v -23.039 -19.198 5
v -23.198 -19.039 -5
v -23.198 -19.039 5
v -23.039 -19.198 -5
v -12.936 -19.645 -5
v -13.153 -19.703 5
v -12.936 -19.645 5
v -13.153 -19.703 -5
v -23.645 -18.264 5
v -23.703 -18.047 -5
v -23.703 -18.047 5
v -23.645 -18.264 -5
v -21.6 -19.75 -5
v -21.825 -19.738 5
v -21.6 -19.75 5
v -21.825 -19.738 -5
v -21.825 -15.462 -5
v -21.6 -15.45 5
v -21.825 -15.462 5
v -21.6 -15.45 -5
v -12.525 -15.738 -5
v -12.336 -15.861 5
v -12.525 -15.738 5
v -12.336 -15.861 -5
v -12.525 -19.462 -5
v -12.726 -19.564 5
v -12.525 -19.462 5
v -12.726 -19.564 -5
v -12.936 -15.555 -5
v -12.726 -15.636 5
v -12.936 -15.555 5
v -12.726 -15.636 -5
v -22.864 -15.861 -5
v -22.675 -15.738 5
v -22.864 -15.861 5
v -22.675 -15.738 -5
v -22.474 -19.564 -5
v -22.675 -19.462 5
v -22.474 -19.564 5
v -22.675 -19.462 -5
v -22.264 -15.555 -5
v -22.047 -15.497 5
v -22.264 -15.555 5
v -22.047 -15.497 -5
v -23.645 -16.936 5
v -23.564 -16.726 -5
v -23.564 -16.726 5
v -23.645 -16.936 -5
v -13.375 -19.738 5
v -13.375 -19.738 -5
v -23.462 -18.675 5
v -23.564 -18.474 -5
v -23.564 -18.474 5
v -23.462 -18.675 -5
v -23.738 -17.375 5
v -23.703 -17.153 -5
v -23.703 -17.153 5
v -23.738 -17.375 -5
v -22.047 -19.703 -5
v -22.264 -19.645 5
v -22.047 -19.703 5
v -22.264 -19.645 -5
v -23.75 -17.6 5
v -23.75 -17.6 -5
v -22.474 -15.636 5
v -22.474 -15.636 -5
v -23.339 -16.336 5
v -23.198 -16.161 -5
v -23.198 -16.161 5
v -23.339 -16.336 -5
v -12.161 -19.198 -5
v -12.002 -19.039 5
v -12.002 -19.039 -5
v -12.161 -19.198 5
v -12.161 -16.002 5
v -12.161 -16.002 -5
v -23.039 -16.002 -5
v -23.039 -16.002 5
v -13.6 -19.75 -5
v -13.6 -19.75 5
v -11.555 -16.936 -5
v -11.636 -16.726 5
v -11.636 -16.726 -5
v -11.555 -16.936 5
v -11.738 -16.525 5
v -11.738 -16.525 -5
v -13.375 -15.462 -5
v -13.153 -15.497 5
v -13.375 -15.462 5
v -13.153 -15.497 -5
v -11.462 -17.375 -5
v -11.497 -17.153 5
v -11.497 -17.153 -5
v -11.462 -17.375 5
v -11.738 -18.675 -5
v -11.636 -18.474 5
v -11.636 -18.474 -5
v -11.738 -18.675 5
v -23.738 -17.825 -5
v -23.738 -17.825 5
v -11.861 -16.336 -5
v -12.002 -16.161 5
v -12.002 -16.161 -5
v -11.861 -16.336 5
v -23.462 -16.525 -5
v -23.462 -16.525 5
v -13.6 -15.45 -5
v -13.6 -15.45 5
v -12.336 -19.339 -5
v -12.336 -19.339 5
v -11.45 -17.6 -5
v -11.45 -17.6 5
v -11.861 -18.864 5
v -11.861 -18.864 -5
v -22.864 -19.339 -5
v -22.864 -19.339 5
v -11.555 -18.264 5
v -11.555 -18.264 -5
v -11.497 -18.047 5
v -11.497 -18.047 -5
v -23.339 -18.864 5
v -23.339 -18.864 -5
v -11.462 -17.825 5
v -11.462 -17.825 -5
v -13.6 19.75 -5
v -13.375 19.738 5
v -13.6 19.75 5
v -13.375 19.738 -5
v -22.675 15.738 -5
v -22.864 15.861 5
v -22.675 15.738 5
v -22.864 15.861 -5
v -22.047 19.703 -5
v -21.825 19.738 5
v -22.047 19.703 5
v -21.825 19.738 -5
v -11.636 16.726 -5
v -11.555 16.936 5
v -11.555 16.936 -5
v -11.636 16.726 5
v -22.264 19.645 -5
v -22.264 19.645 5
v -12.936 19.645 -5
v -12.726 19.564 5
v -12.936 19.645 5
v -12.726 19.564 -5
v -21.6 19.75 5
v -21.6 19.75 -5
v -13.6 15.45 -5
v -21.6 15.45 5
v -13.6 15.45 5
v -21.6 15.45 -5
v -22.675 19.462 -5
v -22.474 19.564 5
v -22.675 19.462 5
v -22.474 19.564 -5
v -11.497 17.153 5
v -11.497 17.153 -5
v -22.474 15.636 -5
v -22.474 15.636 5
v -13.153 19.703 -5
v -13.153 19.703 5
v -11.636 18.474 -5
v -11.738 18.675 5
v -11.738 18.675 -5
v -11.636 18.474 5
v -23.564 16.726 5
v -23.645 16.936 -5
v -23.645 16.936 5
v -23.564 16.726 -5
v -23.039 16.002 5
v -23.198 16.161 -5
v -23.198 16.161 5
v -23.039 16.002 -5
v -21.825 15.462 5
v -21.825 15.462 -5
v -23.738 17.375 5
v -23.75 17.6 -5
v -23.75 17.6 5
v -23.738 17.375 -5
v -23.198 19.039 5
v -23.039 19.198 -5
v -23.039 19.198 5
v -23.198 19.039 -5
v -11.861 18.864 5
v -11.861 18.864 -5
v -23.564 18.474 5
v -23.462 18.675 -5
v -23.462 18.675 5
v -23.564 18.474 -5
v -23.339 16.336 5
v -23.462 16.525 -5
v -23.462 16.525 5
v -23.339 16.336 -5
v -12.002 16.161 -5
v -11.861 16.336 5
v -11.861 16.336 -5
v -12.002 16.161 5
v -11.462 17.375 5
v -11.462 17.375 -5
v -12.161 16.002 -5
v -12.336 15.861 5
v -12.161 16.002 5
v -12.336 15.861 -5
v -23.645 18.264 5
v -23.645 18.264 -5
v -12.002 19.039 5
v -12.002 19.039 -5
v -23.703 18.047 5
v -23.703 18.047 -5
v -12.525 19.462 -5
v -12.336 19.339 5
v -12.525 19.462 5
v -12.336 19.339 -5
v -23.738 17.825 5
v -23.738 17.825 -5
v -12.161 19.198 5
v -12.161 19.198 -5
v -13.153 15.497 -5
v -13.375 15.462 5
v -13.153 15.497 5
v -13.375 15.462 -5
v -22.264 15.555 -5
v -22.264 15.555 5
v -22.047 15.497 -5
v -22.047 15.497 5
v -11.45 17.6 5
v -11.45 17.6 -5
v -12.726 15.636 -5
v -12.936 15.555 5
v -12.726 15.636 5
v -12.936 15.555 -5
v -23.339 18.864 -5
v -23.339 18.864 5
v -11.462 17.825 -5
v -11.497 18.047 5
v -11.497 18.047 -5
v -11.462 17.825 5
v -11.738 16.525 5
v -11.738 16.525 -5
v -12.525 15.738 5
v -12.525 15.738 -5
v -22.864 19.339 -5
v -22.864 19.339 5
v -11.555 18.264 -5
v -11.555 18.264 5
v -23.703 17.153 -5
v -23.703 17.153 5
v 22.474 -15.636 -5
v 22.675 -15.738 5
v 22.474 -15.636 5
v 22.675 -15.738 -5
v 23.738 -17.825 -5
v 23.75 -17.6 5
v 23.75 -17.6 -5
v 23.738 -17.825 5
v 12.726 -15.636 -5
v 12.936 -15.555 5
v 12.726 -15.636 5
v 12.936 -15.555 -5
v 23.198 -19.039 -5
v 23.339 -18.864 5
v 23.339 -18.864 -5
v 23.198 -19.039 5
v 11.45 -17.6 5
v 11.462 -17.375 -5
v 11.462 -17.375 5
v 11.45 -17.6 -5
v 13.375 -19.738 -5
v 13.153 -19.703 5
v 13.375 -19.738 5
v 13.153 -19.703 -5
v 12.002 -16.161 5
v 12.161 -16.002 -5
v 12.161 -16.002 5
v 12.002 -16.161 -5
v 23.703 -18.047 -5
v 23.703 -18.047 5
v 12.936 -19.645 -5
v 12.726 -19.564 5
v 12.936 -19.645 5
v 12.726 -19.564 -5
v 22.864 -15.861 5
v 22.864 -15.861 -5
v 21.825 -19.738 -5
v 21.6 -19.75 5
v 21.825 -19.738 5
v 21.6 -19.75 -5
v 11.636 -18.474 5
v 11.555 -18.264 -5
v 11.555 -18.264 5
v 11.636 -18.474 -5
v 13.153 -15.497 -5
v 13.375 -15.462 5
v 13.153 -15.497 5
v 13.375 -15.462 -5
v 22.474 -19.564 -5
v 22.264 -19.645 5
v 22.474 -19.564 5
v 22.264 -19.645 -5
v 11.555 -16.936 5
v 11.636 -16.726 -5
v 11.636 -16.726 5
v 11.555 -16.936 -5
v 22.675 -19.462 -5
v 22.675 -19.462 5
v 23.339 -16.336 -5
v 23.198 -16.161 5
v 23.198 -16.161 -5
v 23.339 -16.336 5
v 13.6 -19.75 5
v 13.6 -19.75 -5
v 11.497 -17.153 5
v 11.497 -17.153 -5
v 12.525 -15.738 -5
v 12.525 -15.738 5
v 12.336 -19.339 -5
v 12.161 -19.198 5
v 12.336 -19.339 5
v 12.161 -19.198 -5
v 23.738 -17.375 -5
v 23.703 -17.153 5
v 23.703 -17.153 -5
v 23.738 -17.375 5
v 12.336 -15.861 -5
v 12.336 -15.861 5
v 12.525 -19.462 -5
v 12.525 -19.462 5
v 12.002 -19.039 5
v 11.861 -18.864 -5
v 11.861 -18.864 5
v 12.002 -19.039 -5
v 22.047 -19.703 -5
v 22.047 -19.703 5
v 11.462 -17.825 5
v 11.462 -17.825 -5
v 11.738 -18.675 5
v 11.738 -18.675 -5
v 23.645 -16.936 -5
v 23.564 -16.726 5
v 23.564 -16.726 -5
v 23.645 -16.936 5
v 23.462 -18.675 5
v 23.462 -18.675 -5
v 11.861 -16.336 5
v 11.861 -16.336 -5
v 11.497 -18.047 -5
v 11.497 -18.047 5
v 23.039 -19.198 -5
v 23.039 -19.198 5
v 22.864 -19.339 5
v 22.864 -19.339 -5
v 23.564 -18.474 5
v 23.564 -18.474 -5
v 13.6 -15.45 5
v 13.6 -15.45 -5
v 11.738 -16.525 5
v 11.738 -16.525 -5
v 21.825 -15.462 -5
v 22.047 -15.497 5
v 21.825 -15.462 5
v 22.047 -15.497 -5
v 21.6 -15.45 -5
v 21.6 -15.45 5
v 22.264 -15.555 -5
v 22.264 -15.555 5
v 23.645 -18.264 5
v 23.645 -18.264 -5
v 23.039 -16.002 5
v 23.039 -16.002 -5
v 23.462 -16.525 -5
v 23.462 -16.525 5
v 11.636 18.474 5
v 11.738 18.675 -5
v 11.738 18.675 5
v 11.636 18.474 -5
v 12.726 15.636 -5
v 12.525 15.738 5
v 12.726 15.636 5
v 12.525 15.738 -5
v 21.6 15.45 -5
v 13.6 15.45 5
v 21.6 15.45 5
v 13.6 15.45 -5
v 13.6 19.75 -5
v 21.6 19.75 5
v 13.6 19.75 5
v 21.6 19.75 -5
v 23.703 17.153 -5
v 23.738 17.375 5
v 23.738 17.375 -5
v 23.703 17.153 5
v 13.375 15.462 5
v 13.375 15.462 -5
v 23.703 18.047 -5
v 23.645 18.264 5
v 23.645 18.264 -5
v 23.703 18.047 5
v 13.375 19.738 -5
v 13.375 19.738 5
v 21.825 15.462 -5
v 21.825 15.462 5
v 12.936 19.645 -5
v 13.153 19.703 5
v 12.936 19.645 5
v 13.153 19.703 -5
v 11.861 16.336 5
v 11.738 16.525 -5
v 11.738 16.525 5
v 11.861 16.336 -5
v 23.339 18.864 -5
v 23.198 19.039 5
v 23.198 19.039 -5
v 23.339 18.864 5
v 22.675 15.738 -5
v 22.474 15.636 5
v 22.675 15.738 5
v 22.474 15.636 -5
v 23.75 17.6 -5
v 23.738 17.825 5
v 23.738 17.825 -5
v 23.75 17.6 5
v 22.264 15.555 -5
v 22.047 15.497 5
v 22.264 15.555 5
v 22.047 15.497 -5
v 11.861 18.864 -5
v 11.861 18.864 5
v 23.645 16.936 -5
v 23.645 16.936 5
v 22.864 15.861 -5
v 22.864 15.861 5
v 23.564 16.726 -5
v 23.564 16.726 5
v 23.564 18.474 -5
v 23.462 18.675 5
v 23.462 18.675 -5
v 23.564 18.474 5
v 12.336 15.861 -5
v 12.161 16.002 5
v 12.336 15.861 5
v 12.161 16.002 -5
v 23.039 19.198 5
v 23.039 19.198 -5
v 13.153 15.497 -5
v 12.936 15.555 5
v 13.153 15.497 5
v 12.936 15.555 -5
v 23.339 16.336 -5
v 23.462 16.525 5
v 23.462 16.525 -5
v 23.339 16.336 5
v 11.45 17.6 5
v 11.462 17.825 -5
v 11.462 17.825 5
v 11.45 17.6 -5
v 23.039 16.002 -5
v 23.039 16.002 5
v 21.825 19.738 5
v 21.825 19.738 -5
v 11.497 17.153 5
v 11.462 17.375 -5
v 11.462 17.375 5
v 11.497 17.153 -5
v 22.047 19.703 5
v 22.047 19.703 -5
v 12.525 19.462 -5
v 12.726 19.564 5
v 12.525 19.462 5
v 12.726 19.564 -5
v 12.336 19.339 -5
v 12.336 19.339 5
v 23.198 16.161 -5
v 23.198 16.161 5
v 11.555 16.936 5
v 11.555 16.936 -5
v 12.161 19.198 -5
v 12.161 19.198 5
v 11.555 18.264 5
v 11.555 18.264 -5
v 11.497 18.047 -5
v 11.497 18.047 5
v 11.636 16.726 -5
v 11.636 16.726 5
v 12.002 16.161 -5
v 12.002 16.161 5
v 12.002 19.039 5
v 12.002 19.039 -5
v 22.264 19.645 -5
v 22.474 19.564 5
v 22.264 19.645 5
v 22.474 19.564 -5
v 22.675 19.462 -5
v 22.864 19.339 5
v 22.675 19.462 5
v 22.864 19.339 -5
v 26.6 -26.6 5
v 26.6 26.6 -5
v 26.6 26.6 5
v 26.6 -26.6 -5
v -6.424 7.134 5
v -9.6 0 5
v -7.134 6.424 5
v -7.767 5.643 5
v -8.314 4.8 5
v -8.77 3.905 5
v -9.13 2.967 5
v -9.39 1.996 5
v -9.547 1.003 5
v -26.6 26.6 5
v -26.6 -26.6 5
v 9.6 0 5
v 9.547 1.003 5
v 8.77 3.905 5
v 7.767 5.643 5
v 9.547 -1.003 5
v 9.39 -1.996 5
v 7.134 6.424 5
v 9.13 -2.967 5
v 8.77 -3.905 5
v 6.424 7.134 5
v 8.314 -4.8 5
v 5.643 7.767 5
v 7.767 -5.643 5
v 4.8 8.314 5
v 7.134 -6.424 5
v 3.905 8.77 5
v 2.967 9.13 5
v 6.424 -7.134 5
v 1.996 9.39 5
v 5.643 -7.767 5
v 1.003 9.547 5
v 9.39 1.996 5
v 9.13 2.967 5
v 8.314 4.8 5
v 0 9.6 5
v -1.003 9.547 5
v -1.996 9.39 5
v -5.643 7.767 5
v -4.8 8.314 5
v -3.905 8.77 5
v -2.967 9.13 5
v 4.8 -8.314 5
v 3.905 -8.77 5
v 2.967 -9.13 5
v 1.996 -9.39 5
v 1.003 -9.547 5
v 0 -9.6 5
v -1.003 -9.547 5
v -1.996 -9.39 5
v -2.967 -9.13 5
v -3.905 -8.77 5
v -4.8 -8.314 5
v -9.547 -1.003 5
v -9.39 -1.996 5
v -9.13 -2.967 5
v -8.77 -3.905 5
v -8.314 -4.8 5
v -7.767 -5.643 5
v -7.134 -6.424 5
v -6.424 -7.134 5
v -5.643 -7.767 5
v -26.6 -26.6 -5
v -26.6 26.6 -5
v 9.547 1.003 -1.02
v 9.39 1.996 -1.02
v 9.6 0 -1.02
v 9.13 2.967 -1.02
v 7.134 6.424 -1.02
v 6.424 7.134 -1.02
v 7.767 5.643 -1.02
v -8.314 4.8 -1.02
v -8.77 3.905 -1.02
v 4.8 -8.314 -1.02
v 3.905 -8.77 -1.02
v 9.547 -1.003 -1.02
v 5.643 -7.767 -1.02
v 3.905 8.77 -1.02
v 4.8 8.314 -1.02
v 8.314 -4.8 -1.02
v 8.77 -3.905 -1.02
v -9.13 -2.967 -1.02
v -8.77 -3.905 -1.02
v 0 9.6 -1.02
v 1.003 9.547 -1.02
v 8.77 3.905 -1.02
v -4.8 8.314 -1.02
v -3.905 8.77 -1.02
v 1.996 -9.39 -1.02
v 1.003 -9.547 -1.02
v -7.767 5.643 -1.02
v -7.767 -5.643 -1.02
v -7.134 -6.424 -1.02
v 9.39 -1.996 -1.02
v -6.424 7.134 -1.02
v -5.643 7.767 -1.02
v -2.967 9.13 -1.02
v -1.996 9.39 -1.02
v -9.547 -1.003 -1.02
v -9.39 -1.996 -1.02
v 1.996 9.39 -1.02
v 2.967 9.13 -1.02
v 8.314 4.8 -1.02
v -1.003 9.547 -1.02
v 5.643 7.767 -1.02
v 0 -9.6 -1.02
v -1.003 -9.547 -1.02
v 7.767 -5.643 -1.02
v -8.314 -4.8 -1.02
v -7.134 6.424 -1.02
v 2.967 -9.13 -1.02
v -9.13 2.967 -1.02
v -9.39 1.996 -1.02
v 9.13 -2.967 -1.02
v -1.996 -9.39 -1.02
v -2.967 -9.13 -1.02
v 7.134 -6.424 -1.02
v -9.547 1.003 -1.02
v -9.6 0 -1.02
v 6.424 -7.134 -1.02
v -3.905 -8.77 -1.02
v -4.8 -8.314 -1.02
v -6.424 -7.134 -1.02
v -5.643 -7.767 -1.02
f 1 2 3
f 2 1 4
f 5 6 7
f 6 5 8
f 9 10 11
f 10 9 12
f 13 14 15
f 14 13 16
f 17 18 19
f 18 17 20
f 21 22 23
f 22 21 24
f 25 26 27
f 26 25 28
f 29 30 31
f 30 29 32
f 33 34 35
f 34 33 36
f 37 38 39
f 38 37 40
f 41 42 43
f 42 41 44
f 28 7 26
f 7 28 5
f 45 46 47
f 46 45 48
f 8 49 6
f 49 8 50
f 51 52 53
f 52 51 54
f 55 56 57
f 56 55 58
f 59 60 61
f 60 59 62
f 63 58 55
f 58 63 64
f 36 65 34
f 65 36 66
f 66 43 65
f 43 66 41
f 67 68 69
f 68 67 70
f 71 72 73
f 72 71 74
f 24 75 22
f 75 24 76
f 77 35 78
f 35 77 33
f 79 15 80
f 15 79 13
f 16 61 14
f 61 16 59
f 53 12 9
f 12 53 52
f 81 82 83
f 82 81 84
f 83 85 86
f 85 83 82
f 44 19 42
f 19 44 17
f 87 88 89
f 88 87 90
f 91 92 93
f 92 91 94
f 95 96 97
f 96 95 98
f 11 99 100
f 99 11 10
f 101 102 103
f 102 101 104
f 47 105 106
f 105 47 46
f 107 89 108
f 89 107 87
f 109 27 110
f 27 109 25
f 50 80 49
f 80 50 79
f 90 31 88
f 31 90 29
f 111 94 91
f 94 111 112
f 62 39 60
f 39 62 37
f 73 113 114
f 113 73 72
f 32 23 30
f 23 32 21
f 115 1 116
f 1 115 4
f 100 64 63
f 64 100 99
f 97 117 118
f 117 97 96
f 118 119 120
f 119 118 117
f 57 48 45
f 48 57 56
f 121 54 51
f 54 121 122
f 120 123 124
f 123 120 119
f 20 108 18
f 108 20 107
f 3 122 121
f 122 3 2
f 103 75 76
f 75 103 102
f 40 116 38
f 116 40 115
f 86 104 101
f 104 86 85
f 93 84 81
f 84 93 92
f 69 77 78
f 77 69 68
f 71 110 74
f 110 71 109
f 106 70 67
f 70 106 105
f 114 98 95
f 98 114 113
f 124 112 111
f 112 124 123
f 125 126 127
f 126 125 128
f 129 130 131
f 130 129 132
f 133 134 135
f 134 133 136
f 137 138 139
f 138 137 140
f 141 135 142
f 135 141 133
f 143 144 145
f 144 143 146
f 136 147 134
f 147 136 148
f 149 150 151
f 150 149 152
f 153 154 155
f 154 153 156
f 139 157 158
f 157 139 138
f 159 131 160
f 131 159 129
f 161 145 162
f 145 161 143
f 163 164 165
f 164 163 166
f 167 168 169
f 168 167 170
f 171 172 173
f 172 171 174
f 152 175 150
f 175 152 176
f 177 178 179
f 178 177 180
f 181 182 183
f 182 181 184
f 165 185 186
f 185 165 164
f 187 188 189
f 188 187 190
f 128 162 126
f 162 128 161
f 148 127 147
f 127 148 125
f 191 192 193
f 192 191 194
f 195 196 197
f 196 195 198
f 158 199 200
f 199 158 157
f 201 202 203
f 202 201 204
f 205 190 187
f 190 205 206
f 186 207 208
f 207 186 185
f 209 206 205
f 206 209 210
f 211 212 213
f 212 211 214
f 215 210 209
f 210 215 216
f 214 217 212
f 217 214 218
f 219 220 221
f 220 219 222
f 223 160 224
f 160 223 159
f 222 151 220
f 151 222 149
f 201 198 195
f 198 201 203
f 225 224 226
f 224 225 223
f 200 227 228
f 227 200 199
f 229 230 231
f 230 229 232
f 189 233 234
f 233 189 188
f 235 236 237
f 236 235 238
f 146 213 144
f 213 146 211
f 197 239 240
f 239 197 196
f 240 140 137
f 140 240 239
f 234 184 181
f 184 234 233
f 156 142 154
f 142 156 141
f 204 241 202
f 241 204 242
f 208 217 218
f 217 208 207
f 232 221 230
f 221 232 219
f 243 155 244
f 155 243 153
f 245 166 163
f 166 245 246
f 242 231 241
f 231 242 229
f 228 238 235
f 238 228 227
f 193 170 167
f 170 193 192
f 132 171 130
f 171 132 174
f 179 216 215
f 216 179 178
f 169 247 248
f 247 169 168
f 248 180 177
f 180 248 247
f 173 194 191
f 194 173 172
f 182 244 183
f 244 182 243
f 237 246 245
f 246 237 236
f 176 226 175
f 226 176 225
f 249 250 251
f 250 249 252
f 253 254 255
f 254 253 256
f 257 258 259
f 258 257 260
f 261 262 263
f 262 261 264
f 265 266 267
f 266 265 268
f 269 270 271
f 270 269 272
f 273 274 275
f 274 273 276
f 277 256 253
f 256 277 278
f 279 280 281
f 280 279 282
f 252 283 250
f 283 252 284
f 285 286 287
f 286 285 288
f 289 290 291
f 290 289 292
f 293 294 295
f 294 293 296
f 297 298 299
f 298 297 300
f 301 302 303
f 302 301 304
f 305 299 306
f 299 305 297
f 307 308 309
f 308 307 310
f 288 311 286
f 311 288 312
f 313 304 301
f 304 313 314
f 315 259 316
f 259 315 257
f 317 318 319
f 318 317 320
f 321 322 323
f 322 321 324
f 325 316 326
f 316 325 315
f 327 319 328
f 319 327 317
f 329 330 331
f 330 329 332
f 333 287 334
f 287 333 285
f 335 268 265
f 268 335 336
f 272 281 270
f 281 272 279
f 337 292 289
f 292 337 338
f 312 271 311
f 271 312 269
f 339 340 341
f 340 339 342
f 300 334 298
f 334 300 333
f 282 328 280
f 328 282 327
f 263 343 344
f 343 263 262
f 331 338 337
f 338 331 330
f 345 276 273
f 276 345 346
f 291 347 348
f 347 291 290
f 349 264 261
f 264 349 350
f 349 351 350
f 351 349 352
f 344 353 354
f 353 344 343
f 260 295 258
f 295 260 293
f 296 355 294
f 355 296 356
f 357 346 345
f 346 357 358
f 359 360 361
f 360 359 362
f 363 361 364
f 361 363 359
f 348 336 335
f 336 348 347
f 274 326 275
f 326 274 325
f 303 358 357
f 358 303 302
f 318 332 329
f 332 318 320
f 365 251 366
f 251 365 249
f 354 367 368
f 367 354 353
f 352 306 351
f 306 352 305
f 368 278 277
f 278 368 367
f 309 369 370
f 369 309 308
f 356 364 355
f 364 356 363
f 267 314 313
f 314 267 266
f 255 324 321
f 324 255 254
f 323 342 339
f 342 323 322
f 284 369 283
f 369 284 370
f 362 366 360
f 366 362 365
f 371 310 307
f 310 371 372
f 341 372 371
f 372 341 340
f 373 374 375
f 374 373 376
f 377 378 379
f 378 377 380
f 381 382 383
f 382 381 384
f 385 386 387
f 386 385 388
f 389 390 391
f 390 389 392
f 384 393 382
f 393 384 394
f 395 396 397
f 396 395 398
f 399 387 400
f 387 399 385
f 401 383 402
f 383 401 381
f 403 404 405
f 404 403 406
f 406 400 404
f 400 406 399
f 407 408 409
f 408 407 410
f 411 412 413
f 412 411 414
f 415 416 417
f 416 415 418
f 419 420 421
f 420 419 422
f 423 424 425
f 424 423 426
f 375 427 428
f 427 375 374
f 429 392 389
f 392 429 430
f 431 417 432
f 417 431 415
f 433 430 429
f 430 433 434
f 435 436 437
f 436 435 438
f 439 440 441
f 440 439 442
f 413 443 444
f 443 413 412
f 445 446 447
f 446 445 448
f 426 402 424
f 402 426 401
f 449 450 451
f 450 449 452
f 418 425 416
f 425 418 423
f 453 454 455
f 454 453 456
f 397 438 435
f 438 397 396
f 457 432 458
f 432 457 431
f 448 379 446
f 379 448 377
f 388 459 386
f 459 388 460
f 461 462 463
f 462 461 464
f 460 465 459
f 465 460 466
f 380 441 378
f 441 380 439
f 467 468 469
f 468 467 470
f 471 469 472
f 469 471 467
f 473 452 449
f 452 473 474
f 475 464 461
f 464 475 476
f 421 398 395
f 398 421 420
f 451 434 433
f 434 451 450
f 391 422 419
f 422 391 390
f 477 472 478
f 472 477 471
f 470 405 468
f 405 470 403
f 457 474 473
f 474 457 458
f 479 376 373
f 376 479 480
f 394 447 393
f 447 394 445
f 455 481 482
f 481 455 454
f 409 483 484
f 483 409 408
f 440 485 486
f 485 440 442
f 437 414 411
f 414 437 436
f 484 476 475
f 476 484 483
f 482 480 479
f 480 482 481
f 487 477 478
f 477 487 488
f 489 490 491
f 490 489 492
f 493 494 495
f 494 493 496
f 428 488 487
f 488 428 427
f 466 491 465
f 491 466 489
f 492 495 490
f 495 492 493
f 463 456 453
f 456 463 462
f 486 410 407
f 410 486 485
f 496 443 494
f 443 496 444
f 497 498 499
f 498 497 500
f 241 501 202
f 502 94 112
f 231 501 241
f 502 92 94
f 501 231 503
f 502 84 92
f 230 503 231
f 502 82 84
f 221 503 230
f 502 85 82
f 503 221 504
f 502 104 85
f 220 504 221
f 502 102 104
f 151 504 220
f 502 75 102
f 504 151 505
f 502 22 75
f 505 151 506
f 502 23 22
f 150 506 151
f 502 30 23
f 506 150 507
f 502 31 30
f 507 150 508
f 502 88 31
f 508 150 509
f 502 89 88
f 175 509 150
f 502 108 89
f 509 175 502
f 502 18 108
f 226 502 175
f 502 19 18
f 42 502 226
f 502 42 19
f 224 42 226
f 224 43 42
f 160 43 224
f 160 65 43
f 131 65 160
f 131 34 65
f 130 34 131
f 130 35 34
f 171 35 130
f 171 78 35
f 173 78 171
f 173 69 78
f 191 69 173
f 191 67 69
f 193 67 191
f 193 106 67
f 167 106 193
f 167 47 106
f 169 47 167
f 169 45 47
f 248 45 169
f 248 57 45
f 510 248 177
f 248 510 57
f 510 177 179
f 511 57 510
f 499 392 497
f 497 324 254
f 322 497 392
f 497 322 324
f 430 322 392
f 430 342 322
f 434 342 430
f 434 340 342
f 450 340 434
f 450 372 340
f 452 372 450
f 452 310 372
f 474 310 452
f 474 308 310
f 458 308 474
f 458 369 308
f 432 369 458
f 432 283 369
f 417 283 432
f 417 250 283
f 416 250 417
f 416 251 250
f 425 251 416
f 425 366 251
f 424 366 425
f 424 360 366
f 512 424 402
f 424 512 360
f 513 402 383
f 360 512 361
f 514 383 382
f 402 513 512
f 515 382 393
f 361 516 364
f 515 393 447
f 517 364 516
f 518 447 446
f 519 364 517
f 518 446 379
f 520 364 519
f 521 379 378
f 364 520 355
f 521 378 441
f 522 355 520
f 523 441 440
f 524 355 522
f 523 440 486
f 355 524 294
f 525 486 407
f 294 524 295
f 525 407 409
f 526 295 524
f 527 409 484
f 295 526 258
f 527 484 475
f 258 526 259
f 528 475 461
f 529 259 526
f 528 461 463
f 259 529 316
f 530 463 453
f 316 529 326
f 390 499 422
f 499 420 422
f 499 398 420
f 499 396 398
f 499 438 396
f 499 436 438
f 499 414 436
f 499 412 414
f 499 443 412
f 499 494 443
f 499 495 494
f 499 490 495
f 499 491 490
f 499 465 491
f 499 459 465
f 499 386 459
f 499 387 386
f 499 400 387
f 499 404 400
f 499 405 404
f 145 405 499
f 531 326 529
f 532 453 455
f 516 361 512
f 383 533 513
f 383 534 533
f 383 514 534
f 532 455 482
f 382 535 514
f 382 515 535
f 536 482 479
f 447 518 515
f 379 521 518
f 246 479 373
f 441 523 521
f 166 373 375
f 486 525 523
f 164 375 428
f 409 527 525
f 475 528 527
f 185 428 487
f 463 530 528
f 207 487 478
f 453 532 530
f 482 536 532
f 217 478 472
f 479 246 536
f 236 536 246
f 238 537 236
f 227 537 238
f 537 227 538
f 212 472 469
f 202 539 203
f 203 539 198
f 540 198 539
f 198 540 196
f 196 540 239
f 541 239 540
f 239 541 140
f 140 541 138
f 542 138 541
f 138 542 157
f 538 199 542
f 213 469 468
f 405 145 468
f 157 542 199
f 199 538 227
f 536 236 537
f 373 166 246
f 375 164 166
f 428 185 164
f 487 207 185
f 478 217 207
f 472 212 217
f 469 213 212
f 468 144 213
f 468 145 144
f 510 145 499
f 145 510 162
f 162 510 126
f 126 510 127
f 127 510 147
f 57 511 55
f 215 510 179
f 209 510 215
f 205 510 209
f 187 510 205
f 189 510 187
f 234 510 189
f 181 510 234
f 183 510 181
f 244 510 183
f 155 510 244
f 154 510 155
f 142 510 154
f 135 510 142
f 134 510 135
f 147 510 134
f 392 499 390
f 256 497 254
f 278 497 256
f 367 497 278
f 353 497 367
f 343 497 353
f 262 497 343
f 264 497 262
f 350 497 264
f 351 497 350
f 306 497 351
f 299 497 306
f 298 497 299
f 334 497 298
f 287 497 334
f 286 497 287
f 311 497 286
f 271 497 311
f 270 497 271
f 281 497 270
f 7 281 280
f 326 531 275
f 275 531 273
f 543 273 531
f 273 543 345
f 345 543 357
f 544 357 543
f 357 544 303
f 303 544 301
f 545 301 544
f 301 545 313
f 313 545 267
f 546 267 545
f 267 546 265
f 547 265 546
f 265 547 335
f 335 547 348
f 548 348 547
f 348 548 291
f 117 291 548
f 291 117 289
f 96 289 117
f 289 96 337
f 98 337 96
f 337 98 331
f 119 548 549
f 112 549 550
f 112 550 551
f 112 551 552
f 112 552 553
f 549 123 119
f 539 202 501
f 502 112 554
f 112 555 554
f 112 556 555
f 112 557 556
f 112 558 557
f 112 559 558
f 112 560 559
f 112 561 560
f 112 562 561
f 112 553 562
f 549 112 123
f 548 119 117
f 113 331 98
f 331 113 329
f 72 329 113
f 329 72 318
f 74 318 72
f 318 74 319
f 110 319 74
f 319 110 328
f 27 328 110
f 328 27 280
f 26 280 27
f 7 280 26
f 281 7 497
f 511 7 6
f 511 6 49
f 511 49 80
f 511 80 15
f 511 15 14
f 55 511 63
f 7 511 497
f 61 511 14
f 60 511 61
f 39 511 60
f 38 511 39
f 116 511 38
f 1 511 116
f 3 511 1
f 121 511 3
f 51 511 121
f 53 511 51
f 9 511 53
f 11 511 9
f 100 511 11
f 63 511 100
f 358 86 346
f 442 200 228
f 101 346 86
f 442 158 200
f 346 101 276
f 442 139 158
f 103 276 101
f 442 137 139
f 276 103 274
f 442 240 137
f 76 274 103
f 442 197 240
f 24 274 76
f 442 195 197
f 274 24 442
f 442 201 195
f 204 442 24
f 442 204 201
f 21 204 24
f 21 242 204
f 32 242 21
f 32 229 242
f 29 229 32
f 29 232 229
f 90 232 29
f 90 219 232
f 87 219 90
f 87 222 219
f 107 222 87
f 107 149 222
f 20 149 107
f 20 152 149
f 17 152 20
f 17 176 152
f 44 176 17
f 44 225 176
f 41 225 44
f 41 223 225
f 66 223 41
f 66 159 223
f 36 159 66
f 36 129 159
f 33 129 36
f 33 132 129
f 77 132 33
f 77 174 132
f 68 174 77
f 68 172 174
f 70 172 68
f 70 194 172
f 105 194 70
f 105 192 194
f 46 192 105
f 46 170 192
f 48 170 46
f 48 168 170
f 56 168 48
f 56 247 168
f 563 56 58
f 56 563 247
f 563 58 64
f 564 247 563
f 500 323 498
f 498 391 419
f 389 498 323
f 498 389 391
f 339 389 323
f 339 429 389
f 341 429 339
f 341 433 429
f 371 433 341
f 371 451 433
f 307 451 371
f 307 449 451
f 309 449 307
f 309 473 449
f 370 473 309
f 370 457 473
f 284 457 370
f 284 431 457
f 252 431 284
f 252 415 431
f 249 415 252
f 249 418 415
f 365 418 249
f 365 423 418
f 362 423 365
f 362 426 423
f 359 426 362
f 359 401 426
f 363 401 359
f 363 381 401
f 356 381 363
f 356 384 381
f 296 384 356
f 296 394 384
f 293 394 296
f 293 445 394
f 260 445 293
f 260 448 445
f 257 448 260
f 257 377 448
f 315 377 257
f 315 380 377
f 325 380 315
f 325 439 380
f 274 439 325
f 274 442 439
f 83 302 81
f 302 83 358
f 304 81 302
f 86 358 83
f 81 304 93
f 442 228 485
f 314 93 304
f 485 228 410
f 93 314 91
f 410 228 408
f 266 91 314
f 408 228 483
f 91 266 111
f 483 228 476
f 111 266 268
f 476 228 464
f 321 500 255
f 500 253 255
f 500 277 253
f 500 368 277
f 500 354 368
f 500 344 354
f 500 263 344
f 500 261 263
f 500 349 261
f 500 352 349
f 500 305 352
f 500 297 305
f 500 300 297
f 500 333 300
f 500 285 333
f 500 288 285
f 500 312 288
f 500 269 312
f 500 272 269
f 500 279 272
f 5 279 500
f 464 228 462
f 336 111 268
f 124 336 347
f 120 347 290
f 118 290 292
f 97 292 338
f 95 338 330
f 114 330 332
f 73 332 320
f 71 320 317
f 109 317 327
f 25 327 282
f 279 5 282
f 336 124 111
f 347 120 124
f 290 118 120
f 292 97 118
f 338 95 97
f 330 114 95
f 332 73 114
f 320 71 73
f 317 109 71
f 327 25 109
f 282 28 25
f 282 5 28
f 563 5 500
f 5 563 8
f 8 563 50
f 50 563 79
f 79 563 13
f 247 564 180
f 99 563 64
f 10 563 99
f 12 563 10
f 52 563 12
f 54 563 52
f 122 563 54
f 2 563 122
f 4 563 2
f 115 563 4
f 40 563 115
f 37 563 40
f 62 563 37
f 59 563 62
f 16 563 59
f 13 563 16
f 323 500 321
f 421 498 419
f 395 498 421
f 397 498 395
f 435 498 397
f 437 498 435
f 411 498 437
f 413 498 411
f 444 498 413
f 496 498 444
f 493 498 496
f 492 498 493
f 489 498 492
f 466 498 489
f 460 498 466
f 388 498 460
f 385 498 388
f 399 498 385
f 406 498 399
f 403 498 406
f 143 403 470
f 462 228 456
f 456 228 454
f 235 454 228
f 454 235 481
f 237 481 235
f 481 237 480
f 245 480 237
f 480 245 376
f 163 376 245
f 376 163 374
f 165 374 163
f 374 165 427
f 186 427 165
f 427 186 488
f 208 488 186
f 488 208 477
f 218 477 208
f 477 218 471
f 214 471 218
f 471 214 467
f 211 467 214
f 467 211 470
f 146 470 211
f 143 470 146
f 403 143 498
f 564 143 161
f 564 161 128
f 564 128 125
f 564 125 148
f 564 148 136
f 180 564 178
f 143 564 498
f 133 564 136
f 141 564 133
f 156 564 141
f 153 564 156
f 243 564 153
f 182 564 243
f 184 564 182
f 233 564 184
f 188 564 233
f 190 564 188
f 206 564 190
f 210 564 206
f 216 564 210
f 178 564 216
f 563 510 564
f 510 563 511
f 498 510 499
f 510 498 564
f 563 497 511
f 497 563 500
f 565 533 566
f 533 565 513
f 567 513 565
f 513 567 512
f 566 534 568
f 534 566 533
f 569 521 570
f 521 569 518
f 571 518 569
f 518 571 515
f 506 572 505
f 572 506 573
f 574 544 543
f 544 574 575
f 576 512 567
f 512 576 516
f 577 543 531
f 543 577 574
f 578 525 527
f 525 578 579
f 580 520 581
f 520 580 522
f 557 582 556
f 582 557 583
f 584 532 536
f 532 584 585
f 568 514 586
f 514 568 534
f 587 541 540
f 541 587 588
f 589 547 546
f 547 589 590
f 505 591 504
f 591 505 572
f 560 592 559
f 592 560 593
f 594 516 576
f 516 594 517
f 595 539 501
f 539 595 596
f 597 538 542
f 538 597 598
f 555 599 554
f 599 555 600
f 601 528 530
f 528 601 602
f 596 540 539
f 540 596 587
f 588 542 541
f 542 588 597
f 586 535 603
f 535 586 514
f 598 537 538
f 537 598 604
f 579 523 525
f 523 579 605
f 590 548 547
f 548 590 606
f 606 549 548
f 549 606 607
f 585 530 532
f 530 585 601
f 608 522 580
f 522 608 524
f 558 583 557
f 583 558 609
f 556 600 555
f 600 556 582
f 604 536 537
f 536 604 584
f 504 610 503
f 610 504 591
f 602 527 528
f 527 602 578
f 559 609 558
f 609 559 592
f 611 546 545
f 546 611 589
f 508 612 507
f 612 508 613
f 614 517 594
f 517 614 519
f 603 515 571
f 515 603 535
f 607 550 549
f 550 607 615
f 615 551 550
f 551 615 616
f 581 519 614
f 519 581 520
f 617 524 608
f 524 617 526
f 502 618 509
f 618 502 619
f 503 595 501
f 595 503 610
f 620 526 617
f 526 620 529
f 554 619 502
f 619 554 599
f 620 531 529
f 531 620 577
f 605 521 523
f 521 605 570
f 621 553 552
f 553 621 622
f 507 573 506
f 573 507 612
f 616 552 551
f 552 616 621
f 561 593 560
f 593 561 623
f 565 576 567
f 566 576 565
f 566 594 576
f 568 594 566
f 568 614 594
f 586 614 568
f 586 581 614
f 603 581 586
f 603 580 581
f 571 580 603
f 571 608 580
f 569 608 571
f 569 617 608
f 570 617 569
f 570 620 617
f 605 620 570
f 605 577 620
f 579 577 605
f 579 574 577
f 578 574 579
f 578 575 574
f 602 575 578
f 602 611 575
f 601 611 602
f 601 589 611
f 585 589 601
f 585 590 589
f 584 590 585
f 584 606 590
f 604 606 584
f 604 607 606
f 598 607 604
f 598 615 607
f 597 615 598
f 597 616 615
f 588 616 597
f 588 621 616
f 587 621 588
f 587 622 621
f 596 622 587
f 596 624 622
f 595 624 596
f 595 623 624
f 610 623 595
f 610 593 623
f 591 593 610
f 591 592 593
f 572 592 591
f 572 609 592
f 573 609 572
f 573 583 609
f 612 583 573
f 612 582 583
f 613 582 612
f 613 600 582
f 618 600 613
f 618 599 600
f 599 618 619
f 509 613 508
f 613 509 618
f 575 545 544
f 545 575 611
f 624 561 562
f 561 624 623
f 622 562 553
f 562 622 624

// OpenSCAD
// Bearing mounting plate with 19.2 mm pocket.
$fn = 60;
eps = 0.02;
plate_w = 53.2;
plate_t = 10;
bearing_d = 19.2;
pocket_d = 6;
mount_pitch = 35.2;
module slot(x, y) {
    hull() {
        translate([x - 4, y, -plate_t / 2 - eps]) cylinder(d = 4.3, h = plate_t + 2 * eps);
        translate([x + 4, y, -plate_t / 2 - eps]) cylinder(d = 4.3, h = plate_t + 2 * eps);
    }
}
difference() {
    cube([plate_w, plate_w, plate_t], center = true);
    translate([0, 0, plate_t / 2 - pocket_d - eps]) cylinder(d = bearing_d, h = pocket_d + 2 * eps);
    for (x = [-mount_pitch / 2, mount_pitch / 2], y = [-mount_pitch / 2, mount_pitch / 2]) slot(x, y);
}
